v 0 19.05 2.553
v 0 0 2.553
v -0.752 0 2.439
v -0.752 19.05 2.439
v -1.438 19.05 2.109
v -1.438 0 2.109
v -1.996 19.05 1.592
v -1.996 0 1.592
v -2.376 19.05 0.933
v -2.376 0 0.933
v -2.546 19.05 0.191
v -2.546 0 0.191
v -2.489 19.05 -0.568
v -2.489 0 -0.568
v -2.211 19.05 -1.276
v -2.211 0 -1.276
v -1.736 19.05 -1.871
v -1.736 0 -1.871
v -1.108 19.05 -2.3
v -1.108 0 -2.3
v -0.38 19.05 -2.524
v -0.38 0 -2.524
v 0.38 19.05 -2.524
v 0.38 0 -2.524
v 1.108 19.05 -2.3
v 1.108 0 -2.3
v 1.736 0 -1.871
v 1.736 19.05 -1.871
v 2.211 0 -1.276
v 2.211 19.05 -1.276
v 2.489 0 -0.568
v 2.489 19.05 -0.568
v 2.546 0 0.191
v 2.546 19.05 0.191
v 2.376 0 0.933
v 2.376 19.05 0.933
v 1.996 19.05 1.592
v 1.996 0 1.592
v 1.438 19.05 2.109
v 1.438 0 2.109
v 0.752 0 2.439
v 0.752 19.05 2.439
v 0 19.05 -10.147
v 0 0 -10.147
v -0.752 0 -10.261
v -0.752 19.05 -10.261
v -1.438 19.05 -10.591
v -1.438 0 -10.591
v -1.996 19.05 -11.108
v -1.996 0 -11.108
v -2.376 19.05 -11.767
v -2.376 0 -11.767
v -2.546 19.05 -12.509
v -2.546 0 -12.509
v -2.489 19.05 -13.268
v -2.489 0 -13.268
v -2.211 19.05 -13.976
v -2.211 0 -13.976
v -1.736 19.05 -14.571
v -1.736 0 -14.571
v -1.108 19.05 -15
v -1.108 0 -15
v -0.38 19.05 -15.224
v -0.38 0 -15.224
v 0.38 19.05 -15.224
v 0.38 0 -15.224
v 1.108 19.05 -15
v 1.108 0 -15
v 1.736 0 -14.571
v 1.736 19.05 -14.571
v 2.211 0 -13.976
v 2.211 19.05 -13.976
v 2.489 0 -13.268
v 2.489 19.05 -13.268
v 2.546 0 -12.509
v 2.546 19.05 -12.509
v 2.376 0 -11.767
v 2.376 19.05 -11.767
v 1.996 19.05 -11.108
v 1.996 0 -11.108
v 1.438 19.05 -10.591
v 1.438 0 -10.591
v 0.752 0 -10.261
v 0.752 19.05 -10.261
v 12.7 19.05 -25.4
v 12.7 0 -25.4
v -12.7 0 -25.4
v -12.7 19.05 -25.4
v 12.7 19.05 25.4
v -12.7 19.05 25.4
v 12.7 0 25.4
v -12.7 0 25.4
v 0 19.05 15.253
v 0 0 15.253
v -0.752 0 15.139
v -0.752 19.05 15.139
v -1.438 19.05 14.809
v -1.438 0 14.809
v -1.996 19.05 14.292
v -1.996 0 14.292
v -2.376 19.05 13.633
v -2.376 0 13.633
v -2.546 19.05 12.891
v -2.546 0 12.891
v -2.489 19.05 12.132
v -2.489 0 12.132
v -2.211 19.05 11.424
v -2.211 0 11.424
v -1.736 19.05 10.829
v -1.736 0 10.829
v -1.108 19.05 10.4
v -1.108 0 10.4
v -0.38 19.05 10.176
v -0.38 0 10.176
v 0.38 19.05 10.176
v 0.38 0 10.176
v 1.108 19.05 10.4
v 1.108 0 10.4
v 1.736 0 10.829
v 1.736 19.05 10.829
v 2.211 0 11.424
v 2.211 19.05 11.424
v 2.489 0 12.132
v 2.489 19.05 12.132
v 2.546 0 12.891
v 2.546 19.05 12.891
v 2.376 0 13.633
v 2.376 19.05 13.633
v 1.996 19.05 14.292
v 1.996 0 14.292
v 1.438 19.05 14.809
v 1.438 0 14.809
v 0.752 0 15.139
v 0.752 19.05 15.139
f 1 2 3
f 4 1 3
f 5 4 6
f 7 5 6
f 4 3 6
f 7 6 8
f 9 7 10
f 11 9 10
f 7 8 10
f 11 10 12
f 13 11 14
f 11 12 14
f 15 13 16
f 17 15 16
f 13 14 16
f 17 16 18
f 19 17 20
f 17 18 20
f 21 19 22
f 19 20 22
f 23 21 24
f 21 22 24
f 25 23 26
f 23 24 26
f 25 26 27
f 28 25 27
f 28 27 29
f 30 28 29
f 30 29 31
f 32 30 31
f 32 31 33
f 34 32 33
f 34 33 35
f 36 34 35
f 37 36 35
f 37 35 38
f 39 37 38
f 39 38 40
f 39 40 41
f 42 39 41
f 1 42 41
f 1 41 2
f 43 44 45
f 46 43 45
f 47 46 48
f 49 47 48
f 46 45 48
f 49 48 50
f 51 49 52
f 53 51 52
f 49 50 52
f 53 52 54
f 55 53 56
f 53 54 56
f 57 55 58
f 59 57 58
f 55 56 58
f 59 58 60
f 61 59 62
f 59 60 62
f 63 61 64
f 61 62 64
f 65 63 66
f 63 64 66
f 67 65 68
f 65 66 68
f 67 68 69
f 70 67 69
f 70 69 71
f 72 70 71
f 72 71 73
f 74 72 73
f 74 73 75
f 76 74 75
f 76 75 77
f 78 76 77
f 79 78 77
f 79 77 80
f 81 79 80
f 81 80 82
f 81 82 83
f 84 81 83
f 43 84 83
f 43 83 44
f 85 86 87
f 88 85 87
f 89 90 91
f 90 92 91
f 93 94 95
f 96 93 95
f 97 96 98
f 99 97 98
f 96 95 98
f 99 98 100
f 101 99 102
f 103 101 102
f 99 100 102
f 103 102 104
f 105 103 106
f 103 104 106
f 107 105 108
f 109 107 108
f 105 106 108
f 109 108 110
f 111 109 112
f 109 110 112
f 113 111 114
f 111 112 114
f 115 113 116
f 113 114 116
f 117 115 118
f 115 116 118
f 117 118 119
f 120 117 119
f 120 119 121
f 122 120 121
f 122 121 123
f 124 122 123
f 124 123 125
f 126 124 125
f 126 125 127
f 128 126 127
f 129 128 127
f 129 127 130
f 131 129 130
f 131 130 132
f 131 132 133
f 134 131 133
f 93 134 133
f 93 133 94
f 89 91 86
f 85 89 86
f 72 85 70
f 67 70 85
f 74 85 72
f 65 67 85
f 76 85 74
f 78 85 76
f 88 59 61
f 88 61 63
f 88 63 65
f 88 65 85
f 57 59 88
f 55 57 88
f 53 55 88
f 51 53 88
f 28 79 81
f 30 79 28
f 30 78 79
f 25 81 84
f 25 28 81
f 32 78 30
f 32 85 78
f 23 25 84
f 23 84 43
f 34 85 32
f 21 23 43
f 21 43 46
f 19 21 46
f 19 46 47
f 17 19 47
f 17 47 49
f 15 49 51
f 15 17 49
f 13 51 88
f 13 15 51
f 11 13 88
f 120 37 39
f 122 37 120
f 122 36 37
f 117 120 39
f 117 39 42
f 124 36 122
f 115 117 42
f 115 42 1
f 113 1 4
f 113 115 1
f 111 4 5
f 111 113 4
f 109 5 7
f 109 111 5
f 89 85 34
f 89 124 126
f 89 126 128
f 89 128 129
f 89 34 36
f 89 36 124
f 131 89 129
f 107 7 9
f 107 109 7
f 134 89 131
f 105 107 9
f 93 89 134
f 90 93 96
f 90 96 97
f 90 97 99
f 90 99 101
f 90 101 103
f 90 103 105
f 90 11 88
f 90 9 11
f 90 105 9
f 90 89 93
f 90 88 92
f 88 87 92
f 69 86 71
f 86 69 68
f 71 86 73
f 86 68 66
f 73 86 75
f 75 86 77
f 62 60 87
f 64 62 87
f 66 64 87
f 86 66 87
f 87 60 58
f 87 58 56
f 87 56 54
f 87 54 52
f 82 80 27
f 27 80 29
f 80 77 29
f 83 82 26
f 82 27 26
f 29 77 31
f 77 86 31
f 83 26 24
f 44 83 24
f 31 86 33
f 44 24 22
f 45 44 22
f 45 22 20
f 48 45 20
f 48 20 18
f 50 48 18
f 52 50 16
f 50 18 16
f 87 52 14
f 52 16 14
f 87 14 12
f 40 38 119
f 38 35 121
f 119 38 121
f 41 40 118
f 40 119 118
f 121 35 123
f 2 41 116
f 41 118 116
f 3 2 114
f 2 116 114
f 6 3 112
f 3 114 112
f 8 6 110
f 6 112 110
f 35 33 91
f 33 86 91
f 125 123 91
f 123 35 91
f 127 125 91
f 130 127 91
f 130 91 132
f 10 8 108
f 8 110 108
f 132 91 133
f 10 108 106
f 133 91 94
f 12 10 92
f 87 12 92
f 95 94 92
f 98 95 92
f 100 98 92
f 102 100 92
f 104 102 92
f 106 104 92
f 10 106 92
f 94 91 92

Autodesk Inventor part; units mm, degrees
ref_plane "YZ Plane" through (0, 0, 0) normal (1, 0, 0) x (0, 1, 0)
ref_plane "XZ Plane" through (0, 0, 0) normal (0, 1, 0) x (-1, 0, 0)
ref_plane "XY Plane" through (0, 0, 0) normal (0, 0, 1) x (1, 0, 0)
sketch "Sketch2" plane through (0, 0, 0) normal (0, 1, 0) x (-1, 0, 0)
  line L0 (12.7, 25.4) -> (-12.7, 25.4)
  line L1 (-12.7, 25.4) -> (-12.7, -25.4)
  line L2 (-12.7, -25.4) -> (12.7, -25.4)
  line L3 (12.7, -25.4) -> (12.7, 25.4)
  line L4 (12.7, 25.4) -> (-12.7, -25.4) construction
  line L5 (-12.7, 25.4) -> (12.7, -25.4) construction
  point P0 (0, 0)
  dimension "d0" = 25.4
  dimension "d1" = 50.8
extrude "Extrusion1" add sketch "Sketch2" along normal blind 19.05
sketch "Sketch3" plane through (0, 19.05, 0) normal (0, 1, 0) x (1, 0, 0)
  point P0 (0, 0)
  point P1 (0, -12.7)
  point P2 (0, 0)
  point P3 (0, 12.7)
  dimension "d4" = 12.7
  dimension "d5" = 12.7
hole "Hole1" at (0, 19.05, 12.7) at (0, 19.05, 0) at (0, 19.05, -12.7) direction (0, -1, 0) diameter 5.1054 end through all clearance for "Flat Head Machine Screw (82)" size "#10" standard "Ansi Unified Screw Threads"
equation "\"d5\" = d4"
properties part number "CL4-022" material "Aluminum 6061"
